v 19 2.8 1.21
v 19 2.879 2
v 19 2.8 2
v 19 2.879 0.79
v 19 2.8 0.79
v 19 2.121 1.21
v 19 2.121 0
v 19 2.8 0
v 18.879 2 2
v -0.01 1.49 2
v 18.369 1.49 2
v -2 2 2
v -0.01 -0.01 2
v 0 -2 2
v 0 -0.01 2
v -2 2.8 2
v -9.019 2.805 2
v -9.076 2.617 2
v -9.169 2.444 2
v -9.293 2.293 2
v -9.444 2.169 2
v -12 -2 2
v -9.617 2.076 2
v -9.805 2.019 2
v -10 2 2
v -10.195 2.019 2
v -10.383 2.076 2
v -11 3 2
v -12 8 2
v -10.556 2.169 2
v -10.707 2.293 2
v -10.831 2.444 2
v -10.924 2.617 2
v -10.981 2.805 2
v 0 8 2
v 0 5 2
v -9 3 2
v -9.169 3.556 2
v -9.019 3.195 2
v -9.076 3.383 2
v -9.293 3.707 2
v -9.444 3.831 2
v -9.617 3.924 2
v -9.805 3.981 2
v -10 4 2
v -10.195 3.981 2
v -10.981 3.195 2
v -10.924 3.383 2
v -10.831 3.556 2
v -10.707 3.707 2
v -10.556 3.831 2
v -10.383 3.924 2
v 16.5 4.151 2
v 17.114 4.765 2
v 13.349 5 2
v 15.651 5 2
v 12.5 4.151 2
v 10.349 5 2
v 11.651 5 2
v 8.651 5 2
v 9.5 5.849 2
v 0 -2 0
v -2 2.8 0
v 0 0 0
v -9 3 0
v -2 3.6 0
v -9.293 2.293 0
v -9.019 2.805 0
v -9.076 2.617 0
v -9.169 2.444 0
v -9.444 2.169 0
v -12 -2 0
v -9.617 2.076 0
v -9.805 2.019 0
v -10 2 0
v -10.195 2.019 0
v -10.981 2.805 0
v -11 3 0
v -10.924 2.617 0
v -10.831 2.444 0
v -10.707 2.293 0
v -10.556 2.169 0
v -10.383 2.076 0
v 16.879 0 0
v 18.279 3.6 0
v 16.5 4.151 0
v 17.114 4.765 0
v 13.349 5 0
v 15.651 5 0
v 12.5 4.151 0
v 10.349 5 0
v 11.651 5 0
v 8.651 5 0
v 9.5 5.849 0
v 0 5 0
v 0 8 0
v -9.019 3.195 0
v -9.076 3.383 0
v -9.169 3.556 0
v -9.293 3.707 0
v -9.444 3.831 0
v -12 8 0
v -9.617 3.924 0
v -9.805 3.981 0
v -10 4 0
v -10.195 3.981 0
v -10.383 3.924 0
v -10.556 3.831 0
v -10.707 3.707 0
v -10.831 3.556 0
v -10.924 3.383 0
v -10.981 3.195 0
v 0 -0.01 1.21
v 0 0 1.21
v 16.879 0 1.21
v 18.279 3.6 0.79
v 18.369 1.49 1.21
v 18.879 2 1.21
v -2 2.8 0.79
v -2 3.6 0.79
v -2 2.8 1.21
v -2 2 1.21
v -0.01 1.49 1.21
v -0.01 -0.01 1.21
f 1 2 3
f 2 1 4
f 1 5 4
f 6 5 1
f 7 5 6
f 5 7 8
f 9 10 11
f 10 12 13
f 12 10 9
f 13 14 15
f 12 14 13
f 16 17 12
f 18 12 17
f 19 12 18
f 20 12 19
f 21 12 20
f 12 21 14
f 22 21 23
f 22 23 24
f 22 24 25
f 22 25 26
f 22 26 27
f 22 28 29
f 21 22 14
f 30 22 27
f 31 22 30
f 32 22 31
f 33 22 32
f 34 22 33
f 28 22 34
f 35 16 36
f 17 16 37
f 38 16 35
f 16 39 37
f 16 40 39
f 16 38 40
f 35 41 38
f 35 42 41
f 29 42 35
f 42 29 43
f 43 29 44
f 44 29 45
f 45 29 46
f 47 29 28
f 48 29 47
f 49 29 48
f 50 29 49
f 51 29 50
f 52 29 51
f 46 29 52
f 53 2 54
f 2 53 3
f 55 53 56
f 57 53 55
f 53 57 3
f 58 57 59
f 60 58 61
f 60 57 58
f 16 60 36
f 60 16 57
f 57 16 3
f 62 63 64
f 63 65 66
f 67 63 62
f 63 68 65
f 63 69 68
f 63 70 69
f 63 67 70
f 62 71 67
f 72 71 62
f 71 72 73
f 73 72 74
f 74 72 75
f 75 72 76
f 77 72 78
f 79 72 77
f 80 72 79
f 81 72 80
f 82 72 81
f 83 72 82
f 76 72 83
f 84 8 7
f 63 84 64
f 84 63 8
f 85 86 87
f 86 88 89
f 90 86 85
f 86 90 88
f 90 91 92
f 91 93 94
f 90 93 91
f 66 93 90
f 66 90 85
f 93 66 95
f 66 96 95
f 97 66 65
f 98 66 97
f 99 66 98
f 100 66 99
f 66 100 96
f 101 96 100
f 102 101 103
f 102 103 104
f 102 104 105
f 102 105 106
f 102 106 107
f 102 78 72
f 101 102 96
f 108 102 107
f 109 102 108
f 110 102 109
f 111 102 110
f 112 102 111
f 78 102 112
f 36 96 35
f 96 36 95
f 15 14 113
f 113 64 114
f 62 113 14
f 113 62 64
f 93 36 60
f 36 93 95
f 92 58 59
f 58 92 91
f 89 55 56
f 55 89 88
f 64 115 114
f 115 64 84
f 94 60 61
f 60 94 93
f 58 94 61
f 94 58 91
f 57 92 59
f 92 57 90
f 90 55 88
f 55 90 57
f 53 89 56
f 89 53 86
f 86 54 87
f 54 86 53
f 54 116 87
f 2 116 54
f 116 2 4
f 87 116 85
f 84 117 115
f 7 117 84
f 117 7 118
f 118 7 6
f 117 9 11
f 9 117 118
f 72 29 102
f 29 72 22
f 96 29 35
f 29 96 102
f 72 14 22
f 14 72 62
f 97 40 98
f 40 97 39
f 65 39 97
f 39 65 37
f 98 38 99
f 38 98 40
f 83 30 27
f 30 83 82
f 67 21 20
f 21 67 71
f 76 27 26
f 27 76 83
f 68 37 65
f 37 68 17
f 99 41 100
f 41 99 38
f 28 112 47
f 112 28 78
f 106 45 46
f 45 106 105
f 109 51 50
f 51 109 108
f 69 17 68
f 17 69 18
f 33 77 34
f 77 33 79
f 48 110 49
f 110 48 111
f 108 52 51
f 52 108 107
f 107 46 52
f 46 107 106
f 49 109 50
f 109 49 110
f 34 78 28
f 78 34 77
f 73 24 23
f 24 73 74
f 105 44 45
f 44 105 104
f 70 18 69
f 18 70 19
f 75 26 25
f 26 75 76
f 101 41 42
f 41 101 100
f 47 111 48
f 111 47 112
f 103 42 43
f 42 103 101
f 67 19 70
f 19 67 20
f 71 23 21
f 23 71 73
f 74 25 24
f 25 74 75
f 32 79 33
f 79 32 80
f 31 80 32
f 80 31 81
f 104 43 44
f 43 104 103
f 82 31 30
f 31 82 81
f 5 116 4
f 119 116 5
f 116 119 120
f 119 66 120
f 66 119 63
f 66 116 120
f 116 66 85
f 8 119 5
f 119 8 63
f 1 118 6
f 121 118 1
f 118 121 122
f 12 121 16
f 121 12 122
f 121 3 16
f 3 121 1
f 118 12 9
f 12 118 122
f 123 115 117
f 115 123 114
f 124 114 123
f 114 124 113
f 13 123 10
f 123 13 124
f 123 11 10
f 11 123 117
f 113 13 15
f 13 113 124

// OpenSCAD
// print flat at 0.08mm layer height

module A_ShaftCut(length=8) {
  CUT_SIZE=[length,length,3];
  
  rotate([0,0,45])
  translate([0,0,0.5*CUT_SIZE[2]-0.5])
  translate(CUT_SIZE*-.5)
    cube(CUT_SIZE);
}

module A_Tooth() {
  SIZE_TOOTH=[1.2,1.2,2];
  
  rotate([0,0,45])
  translate([0,0,SIZE_TOOTH[2]*.5])
  translate(-.5*SIZE_TOOTH)
    cube(SIZE_TOOTH);
}

module A_Shaft() {
  difference() {
    union() {
      cube([19,5,2]);

      translate([9.5,5,0])
        A_Tooth();
    }
    
    translate([12.5,5,0])
      A_Tooth();

    translate([16.5,5,0])
      A_Tooth();
    
    // Bevelled ends
    translate([19,5,0])
      A_ShaftCut(3);
    
    translate([19,0,0])
      A_ShaftCut(3);
  }
}

module B_KeyBlank() {
  difference(){
    union() {
      // head
      translate([-12,-2,0])
        cube([12,10,2]);
      
      A_Shaft();
    }
    
    translate([-10,3,-1])
    cylinder(r=1, $fn=32, h=4);
    
    // channel 1
    translate([-2,2.8,-0.01])
      cube([19+4,0.8,0.8]);
   
    // channel 2
    translate([-2,2,2-0.8+0.01])
      cube([19+4,0.8,0.8]);
    
    // channel 3 (at the bottom of the blank)
    translate([-0.01,-0.01,2-0.8+0.01])
      cube([19+1,1.5,0.8]);
  }
}

module Z_Main(){

  B_KeyBlank();
  
}

Z_Main();
